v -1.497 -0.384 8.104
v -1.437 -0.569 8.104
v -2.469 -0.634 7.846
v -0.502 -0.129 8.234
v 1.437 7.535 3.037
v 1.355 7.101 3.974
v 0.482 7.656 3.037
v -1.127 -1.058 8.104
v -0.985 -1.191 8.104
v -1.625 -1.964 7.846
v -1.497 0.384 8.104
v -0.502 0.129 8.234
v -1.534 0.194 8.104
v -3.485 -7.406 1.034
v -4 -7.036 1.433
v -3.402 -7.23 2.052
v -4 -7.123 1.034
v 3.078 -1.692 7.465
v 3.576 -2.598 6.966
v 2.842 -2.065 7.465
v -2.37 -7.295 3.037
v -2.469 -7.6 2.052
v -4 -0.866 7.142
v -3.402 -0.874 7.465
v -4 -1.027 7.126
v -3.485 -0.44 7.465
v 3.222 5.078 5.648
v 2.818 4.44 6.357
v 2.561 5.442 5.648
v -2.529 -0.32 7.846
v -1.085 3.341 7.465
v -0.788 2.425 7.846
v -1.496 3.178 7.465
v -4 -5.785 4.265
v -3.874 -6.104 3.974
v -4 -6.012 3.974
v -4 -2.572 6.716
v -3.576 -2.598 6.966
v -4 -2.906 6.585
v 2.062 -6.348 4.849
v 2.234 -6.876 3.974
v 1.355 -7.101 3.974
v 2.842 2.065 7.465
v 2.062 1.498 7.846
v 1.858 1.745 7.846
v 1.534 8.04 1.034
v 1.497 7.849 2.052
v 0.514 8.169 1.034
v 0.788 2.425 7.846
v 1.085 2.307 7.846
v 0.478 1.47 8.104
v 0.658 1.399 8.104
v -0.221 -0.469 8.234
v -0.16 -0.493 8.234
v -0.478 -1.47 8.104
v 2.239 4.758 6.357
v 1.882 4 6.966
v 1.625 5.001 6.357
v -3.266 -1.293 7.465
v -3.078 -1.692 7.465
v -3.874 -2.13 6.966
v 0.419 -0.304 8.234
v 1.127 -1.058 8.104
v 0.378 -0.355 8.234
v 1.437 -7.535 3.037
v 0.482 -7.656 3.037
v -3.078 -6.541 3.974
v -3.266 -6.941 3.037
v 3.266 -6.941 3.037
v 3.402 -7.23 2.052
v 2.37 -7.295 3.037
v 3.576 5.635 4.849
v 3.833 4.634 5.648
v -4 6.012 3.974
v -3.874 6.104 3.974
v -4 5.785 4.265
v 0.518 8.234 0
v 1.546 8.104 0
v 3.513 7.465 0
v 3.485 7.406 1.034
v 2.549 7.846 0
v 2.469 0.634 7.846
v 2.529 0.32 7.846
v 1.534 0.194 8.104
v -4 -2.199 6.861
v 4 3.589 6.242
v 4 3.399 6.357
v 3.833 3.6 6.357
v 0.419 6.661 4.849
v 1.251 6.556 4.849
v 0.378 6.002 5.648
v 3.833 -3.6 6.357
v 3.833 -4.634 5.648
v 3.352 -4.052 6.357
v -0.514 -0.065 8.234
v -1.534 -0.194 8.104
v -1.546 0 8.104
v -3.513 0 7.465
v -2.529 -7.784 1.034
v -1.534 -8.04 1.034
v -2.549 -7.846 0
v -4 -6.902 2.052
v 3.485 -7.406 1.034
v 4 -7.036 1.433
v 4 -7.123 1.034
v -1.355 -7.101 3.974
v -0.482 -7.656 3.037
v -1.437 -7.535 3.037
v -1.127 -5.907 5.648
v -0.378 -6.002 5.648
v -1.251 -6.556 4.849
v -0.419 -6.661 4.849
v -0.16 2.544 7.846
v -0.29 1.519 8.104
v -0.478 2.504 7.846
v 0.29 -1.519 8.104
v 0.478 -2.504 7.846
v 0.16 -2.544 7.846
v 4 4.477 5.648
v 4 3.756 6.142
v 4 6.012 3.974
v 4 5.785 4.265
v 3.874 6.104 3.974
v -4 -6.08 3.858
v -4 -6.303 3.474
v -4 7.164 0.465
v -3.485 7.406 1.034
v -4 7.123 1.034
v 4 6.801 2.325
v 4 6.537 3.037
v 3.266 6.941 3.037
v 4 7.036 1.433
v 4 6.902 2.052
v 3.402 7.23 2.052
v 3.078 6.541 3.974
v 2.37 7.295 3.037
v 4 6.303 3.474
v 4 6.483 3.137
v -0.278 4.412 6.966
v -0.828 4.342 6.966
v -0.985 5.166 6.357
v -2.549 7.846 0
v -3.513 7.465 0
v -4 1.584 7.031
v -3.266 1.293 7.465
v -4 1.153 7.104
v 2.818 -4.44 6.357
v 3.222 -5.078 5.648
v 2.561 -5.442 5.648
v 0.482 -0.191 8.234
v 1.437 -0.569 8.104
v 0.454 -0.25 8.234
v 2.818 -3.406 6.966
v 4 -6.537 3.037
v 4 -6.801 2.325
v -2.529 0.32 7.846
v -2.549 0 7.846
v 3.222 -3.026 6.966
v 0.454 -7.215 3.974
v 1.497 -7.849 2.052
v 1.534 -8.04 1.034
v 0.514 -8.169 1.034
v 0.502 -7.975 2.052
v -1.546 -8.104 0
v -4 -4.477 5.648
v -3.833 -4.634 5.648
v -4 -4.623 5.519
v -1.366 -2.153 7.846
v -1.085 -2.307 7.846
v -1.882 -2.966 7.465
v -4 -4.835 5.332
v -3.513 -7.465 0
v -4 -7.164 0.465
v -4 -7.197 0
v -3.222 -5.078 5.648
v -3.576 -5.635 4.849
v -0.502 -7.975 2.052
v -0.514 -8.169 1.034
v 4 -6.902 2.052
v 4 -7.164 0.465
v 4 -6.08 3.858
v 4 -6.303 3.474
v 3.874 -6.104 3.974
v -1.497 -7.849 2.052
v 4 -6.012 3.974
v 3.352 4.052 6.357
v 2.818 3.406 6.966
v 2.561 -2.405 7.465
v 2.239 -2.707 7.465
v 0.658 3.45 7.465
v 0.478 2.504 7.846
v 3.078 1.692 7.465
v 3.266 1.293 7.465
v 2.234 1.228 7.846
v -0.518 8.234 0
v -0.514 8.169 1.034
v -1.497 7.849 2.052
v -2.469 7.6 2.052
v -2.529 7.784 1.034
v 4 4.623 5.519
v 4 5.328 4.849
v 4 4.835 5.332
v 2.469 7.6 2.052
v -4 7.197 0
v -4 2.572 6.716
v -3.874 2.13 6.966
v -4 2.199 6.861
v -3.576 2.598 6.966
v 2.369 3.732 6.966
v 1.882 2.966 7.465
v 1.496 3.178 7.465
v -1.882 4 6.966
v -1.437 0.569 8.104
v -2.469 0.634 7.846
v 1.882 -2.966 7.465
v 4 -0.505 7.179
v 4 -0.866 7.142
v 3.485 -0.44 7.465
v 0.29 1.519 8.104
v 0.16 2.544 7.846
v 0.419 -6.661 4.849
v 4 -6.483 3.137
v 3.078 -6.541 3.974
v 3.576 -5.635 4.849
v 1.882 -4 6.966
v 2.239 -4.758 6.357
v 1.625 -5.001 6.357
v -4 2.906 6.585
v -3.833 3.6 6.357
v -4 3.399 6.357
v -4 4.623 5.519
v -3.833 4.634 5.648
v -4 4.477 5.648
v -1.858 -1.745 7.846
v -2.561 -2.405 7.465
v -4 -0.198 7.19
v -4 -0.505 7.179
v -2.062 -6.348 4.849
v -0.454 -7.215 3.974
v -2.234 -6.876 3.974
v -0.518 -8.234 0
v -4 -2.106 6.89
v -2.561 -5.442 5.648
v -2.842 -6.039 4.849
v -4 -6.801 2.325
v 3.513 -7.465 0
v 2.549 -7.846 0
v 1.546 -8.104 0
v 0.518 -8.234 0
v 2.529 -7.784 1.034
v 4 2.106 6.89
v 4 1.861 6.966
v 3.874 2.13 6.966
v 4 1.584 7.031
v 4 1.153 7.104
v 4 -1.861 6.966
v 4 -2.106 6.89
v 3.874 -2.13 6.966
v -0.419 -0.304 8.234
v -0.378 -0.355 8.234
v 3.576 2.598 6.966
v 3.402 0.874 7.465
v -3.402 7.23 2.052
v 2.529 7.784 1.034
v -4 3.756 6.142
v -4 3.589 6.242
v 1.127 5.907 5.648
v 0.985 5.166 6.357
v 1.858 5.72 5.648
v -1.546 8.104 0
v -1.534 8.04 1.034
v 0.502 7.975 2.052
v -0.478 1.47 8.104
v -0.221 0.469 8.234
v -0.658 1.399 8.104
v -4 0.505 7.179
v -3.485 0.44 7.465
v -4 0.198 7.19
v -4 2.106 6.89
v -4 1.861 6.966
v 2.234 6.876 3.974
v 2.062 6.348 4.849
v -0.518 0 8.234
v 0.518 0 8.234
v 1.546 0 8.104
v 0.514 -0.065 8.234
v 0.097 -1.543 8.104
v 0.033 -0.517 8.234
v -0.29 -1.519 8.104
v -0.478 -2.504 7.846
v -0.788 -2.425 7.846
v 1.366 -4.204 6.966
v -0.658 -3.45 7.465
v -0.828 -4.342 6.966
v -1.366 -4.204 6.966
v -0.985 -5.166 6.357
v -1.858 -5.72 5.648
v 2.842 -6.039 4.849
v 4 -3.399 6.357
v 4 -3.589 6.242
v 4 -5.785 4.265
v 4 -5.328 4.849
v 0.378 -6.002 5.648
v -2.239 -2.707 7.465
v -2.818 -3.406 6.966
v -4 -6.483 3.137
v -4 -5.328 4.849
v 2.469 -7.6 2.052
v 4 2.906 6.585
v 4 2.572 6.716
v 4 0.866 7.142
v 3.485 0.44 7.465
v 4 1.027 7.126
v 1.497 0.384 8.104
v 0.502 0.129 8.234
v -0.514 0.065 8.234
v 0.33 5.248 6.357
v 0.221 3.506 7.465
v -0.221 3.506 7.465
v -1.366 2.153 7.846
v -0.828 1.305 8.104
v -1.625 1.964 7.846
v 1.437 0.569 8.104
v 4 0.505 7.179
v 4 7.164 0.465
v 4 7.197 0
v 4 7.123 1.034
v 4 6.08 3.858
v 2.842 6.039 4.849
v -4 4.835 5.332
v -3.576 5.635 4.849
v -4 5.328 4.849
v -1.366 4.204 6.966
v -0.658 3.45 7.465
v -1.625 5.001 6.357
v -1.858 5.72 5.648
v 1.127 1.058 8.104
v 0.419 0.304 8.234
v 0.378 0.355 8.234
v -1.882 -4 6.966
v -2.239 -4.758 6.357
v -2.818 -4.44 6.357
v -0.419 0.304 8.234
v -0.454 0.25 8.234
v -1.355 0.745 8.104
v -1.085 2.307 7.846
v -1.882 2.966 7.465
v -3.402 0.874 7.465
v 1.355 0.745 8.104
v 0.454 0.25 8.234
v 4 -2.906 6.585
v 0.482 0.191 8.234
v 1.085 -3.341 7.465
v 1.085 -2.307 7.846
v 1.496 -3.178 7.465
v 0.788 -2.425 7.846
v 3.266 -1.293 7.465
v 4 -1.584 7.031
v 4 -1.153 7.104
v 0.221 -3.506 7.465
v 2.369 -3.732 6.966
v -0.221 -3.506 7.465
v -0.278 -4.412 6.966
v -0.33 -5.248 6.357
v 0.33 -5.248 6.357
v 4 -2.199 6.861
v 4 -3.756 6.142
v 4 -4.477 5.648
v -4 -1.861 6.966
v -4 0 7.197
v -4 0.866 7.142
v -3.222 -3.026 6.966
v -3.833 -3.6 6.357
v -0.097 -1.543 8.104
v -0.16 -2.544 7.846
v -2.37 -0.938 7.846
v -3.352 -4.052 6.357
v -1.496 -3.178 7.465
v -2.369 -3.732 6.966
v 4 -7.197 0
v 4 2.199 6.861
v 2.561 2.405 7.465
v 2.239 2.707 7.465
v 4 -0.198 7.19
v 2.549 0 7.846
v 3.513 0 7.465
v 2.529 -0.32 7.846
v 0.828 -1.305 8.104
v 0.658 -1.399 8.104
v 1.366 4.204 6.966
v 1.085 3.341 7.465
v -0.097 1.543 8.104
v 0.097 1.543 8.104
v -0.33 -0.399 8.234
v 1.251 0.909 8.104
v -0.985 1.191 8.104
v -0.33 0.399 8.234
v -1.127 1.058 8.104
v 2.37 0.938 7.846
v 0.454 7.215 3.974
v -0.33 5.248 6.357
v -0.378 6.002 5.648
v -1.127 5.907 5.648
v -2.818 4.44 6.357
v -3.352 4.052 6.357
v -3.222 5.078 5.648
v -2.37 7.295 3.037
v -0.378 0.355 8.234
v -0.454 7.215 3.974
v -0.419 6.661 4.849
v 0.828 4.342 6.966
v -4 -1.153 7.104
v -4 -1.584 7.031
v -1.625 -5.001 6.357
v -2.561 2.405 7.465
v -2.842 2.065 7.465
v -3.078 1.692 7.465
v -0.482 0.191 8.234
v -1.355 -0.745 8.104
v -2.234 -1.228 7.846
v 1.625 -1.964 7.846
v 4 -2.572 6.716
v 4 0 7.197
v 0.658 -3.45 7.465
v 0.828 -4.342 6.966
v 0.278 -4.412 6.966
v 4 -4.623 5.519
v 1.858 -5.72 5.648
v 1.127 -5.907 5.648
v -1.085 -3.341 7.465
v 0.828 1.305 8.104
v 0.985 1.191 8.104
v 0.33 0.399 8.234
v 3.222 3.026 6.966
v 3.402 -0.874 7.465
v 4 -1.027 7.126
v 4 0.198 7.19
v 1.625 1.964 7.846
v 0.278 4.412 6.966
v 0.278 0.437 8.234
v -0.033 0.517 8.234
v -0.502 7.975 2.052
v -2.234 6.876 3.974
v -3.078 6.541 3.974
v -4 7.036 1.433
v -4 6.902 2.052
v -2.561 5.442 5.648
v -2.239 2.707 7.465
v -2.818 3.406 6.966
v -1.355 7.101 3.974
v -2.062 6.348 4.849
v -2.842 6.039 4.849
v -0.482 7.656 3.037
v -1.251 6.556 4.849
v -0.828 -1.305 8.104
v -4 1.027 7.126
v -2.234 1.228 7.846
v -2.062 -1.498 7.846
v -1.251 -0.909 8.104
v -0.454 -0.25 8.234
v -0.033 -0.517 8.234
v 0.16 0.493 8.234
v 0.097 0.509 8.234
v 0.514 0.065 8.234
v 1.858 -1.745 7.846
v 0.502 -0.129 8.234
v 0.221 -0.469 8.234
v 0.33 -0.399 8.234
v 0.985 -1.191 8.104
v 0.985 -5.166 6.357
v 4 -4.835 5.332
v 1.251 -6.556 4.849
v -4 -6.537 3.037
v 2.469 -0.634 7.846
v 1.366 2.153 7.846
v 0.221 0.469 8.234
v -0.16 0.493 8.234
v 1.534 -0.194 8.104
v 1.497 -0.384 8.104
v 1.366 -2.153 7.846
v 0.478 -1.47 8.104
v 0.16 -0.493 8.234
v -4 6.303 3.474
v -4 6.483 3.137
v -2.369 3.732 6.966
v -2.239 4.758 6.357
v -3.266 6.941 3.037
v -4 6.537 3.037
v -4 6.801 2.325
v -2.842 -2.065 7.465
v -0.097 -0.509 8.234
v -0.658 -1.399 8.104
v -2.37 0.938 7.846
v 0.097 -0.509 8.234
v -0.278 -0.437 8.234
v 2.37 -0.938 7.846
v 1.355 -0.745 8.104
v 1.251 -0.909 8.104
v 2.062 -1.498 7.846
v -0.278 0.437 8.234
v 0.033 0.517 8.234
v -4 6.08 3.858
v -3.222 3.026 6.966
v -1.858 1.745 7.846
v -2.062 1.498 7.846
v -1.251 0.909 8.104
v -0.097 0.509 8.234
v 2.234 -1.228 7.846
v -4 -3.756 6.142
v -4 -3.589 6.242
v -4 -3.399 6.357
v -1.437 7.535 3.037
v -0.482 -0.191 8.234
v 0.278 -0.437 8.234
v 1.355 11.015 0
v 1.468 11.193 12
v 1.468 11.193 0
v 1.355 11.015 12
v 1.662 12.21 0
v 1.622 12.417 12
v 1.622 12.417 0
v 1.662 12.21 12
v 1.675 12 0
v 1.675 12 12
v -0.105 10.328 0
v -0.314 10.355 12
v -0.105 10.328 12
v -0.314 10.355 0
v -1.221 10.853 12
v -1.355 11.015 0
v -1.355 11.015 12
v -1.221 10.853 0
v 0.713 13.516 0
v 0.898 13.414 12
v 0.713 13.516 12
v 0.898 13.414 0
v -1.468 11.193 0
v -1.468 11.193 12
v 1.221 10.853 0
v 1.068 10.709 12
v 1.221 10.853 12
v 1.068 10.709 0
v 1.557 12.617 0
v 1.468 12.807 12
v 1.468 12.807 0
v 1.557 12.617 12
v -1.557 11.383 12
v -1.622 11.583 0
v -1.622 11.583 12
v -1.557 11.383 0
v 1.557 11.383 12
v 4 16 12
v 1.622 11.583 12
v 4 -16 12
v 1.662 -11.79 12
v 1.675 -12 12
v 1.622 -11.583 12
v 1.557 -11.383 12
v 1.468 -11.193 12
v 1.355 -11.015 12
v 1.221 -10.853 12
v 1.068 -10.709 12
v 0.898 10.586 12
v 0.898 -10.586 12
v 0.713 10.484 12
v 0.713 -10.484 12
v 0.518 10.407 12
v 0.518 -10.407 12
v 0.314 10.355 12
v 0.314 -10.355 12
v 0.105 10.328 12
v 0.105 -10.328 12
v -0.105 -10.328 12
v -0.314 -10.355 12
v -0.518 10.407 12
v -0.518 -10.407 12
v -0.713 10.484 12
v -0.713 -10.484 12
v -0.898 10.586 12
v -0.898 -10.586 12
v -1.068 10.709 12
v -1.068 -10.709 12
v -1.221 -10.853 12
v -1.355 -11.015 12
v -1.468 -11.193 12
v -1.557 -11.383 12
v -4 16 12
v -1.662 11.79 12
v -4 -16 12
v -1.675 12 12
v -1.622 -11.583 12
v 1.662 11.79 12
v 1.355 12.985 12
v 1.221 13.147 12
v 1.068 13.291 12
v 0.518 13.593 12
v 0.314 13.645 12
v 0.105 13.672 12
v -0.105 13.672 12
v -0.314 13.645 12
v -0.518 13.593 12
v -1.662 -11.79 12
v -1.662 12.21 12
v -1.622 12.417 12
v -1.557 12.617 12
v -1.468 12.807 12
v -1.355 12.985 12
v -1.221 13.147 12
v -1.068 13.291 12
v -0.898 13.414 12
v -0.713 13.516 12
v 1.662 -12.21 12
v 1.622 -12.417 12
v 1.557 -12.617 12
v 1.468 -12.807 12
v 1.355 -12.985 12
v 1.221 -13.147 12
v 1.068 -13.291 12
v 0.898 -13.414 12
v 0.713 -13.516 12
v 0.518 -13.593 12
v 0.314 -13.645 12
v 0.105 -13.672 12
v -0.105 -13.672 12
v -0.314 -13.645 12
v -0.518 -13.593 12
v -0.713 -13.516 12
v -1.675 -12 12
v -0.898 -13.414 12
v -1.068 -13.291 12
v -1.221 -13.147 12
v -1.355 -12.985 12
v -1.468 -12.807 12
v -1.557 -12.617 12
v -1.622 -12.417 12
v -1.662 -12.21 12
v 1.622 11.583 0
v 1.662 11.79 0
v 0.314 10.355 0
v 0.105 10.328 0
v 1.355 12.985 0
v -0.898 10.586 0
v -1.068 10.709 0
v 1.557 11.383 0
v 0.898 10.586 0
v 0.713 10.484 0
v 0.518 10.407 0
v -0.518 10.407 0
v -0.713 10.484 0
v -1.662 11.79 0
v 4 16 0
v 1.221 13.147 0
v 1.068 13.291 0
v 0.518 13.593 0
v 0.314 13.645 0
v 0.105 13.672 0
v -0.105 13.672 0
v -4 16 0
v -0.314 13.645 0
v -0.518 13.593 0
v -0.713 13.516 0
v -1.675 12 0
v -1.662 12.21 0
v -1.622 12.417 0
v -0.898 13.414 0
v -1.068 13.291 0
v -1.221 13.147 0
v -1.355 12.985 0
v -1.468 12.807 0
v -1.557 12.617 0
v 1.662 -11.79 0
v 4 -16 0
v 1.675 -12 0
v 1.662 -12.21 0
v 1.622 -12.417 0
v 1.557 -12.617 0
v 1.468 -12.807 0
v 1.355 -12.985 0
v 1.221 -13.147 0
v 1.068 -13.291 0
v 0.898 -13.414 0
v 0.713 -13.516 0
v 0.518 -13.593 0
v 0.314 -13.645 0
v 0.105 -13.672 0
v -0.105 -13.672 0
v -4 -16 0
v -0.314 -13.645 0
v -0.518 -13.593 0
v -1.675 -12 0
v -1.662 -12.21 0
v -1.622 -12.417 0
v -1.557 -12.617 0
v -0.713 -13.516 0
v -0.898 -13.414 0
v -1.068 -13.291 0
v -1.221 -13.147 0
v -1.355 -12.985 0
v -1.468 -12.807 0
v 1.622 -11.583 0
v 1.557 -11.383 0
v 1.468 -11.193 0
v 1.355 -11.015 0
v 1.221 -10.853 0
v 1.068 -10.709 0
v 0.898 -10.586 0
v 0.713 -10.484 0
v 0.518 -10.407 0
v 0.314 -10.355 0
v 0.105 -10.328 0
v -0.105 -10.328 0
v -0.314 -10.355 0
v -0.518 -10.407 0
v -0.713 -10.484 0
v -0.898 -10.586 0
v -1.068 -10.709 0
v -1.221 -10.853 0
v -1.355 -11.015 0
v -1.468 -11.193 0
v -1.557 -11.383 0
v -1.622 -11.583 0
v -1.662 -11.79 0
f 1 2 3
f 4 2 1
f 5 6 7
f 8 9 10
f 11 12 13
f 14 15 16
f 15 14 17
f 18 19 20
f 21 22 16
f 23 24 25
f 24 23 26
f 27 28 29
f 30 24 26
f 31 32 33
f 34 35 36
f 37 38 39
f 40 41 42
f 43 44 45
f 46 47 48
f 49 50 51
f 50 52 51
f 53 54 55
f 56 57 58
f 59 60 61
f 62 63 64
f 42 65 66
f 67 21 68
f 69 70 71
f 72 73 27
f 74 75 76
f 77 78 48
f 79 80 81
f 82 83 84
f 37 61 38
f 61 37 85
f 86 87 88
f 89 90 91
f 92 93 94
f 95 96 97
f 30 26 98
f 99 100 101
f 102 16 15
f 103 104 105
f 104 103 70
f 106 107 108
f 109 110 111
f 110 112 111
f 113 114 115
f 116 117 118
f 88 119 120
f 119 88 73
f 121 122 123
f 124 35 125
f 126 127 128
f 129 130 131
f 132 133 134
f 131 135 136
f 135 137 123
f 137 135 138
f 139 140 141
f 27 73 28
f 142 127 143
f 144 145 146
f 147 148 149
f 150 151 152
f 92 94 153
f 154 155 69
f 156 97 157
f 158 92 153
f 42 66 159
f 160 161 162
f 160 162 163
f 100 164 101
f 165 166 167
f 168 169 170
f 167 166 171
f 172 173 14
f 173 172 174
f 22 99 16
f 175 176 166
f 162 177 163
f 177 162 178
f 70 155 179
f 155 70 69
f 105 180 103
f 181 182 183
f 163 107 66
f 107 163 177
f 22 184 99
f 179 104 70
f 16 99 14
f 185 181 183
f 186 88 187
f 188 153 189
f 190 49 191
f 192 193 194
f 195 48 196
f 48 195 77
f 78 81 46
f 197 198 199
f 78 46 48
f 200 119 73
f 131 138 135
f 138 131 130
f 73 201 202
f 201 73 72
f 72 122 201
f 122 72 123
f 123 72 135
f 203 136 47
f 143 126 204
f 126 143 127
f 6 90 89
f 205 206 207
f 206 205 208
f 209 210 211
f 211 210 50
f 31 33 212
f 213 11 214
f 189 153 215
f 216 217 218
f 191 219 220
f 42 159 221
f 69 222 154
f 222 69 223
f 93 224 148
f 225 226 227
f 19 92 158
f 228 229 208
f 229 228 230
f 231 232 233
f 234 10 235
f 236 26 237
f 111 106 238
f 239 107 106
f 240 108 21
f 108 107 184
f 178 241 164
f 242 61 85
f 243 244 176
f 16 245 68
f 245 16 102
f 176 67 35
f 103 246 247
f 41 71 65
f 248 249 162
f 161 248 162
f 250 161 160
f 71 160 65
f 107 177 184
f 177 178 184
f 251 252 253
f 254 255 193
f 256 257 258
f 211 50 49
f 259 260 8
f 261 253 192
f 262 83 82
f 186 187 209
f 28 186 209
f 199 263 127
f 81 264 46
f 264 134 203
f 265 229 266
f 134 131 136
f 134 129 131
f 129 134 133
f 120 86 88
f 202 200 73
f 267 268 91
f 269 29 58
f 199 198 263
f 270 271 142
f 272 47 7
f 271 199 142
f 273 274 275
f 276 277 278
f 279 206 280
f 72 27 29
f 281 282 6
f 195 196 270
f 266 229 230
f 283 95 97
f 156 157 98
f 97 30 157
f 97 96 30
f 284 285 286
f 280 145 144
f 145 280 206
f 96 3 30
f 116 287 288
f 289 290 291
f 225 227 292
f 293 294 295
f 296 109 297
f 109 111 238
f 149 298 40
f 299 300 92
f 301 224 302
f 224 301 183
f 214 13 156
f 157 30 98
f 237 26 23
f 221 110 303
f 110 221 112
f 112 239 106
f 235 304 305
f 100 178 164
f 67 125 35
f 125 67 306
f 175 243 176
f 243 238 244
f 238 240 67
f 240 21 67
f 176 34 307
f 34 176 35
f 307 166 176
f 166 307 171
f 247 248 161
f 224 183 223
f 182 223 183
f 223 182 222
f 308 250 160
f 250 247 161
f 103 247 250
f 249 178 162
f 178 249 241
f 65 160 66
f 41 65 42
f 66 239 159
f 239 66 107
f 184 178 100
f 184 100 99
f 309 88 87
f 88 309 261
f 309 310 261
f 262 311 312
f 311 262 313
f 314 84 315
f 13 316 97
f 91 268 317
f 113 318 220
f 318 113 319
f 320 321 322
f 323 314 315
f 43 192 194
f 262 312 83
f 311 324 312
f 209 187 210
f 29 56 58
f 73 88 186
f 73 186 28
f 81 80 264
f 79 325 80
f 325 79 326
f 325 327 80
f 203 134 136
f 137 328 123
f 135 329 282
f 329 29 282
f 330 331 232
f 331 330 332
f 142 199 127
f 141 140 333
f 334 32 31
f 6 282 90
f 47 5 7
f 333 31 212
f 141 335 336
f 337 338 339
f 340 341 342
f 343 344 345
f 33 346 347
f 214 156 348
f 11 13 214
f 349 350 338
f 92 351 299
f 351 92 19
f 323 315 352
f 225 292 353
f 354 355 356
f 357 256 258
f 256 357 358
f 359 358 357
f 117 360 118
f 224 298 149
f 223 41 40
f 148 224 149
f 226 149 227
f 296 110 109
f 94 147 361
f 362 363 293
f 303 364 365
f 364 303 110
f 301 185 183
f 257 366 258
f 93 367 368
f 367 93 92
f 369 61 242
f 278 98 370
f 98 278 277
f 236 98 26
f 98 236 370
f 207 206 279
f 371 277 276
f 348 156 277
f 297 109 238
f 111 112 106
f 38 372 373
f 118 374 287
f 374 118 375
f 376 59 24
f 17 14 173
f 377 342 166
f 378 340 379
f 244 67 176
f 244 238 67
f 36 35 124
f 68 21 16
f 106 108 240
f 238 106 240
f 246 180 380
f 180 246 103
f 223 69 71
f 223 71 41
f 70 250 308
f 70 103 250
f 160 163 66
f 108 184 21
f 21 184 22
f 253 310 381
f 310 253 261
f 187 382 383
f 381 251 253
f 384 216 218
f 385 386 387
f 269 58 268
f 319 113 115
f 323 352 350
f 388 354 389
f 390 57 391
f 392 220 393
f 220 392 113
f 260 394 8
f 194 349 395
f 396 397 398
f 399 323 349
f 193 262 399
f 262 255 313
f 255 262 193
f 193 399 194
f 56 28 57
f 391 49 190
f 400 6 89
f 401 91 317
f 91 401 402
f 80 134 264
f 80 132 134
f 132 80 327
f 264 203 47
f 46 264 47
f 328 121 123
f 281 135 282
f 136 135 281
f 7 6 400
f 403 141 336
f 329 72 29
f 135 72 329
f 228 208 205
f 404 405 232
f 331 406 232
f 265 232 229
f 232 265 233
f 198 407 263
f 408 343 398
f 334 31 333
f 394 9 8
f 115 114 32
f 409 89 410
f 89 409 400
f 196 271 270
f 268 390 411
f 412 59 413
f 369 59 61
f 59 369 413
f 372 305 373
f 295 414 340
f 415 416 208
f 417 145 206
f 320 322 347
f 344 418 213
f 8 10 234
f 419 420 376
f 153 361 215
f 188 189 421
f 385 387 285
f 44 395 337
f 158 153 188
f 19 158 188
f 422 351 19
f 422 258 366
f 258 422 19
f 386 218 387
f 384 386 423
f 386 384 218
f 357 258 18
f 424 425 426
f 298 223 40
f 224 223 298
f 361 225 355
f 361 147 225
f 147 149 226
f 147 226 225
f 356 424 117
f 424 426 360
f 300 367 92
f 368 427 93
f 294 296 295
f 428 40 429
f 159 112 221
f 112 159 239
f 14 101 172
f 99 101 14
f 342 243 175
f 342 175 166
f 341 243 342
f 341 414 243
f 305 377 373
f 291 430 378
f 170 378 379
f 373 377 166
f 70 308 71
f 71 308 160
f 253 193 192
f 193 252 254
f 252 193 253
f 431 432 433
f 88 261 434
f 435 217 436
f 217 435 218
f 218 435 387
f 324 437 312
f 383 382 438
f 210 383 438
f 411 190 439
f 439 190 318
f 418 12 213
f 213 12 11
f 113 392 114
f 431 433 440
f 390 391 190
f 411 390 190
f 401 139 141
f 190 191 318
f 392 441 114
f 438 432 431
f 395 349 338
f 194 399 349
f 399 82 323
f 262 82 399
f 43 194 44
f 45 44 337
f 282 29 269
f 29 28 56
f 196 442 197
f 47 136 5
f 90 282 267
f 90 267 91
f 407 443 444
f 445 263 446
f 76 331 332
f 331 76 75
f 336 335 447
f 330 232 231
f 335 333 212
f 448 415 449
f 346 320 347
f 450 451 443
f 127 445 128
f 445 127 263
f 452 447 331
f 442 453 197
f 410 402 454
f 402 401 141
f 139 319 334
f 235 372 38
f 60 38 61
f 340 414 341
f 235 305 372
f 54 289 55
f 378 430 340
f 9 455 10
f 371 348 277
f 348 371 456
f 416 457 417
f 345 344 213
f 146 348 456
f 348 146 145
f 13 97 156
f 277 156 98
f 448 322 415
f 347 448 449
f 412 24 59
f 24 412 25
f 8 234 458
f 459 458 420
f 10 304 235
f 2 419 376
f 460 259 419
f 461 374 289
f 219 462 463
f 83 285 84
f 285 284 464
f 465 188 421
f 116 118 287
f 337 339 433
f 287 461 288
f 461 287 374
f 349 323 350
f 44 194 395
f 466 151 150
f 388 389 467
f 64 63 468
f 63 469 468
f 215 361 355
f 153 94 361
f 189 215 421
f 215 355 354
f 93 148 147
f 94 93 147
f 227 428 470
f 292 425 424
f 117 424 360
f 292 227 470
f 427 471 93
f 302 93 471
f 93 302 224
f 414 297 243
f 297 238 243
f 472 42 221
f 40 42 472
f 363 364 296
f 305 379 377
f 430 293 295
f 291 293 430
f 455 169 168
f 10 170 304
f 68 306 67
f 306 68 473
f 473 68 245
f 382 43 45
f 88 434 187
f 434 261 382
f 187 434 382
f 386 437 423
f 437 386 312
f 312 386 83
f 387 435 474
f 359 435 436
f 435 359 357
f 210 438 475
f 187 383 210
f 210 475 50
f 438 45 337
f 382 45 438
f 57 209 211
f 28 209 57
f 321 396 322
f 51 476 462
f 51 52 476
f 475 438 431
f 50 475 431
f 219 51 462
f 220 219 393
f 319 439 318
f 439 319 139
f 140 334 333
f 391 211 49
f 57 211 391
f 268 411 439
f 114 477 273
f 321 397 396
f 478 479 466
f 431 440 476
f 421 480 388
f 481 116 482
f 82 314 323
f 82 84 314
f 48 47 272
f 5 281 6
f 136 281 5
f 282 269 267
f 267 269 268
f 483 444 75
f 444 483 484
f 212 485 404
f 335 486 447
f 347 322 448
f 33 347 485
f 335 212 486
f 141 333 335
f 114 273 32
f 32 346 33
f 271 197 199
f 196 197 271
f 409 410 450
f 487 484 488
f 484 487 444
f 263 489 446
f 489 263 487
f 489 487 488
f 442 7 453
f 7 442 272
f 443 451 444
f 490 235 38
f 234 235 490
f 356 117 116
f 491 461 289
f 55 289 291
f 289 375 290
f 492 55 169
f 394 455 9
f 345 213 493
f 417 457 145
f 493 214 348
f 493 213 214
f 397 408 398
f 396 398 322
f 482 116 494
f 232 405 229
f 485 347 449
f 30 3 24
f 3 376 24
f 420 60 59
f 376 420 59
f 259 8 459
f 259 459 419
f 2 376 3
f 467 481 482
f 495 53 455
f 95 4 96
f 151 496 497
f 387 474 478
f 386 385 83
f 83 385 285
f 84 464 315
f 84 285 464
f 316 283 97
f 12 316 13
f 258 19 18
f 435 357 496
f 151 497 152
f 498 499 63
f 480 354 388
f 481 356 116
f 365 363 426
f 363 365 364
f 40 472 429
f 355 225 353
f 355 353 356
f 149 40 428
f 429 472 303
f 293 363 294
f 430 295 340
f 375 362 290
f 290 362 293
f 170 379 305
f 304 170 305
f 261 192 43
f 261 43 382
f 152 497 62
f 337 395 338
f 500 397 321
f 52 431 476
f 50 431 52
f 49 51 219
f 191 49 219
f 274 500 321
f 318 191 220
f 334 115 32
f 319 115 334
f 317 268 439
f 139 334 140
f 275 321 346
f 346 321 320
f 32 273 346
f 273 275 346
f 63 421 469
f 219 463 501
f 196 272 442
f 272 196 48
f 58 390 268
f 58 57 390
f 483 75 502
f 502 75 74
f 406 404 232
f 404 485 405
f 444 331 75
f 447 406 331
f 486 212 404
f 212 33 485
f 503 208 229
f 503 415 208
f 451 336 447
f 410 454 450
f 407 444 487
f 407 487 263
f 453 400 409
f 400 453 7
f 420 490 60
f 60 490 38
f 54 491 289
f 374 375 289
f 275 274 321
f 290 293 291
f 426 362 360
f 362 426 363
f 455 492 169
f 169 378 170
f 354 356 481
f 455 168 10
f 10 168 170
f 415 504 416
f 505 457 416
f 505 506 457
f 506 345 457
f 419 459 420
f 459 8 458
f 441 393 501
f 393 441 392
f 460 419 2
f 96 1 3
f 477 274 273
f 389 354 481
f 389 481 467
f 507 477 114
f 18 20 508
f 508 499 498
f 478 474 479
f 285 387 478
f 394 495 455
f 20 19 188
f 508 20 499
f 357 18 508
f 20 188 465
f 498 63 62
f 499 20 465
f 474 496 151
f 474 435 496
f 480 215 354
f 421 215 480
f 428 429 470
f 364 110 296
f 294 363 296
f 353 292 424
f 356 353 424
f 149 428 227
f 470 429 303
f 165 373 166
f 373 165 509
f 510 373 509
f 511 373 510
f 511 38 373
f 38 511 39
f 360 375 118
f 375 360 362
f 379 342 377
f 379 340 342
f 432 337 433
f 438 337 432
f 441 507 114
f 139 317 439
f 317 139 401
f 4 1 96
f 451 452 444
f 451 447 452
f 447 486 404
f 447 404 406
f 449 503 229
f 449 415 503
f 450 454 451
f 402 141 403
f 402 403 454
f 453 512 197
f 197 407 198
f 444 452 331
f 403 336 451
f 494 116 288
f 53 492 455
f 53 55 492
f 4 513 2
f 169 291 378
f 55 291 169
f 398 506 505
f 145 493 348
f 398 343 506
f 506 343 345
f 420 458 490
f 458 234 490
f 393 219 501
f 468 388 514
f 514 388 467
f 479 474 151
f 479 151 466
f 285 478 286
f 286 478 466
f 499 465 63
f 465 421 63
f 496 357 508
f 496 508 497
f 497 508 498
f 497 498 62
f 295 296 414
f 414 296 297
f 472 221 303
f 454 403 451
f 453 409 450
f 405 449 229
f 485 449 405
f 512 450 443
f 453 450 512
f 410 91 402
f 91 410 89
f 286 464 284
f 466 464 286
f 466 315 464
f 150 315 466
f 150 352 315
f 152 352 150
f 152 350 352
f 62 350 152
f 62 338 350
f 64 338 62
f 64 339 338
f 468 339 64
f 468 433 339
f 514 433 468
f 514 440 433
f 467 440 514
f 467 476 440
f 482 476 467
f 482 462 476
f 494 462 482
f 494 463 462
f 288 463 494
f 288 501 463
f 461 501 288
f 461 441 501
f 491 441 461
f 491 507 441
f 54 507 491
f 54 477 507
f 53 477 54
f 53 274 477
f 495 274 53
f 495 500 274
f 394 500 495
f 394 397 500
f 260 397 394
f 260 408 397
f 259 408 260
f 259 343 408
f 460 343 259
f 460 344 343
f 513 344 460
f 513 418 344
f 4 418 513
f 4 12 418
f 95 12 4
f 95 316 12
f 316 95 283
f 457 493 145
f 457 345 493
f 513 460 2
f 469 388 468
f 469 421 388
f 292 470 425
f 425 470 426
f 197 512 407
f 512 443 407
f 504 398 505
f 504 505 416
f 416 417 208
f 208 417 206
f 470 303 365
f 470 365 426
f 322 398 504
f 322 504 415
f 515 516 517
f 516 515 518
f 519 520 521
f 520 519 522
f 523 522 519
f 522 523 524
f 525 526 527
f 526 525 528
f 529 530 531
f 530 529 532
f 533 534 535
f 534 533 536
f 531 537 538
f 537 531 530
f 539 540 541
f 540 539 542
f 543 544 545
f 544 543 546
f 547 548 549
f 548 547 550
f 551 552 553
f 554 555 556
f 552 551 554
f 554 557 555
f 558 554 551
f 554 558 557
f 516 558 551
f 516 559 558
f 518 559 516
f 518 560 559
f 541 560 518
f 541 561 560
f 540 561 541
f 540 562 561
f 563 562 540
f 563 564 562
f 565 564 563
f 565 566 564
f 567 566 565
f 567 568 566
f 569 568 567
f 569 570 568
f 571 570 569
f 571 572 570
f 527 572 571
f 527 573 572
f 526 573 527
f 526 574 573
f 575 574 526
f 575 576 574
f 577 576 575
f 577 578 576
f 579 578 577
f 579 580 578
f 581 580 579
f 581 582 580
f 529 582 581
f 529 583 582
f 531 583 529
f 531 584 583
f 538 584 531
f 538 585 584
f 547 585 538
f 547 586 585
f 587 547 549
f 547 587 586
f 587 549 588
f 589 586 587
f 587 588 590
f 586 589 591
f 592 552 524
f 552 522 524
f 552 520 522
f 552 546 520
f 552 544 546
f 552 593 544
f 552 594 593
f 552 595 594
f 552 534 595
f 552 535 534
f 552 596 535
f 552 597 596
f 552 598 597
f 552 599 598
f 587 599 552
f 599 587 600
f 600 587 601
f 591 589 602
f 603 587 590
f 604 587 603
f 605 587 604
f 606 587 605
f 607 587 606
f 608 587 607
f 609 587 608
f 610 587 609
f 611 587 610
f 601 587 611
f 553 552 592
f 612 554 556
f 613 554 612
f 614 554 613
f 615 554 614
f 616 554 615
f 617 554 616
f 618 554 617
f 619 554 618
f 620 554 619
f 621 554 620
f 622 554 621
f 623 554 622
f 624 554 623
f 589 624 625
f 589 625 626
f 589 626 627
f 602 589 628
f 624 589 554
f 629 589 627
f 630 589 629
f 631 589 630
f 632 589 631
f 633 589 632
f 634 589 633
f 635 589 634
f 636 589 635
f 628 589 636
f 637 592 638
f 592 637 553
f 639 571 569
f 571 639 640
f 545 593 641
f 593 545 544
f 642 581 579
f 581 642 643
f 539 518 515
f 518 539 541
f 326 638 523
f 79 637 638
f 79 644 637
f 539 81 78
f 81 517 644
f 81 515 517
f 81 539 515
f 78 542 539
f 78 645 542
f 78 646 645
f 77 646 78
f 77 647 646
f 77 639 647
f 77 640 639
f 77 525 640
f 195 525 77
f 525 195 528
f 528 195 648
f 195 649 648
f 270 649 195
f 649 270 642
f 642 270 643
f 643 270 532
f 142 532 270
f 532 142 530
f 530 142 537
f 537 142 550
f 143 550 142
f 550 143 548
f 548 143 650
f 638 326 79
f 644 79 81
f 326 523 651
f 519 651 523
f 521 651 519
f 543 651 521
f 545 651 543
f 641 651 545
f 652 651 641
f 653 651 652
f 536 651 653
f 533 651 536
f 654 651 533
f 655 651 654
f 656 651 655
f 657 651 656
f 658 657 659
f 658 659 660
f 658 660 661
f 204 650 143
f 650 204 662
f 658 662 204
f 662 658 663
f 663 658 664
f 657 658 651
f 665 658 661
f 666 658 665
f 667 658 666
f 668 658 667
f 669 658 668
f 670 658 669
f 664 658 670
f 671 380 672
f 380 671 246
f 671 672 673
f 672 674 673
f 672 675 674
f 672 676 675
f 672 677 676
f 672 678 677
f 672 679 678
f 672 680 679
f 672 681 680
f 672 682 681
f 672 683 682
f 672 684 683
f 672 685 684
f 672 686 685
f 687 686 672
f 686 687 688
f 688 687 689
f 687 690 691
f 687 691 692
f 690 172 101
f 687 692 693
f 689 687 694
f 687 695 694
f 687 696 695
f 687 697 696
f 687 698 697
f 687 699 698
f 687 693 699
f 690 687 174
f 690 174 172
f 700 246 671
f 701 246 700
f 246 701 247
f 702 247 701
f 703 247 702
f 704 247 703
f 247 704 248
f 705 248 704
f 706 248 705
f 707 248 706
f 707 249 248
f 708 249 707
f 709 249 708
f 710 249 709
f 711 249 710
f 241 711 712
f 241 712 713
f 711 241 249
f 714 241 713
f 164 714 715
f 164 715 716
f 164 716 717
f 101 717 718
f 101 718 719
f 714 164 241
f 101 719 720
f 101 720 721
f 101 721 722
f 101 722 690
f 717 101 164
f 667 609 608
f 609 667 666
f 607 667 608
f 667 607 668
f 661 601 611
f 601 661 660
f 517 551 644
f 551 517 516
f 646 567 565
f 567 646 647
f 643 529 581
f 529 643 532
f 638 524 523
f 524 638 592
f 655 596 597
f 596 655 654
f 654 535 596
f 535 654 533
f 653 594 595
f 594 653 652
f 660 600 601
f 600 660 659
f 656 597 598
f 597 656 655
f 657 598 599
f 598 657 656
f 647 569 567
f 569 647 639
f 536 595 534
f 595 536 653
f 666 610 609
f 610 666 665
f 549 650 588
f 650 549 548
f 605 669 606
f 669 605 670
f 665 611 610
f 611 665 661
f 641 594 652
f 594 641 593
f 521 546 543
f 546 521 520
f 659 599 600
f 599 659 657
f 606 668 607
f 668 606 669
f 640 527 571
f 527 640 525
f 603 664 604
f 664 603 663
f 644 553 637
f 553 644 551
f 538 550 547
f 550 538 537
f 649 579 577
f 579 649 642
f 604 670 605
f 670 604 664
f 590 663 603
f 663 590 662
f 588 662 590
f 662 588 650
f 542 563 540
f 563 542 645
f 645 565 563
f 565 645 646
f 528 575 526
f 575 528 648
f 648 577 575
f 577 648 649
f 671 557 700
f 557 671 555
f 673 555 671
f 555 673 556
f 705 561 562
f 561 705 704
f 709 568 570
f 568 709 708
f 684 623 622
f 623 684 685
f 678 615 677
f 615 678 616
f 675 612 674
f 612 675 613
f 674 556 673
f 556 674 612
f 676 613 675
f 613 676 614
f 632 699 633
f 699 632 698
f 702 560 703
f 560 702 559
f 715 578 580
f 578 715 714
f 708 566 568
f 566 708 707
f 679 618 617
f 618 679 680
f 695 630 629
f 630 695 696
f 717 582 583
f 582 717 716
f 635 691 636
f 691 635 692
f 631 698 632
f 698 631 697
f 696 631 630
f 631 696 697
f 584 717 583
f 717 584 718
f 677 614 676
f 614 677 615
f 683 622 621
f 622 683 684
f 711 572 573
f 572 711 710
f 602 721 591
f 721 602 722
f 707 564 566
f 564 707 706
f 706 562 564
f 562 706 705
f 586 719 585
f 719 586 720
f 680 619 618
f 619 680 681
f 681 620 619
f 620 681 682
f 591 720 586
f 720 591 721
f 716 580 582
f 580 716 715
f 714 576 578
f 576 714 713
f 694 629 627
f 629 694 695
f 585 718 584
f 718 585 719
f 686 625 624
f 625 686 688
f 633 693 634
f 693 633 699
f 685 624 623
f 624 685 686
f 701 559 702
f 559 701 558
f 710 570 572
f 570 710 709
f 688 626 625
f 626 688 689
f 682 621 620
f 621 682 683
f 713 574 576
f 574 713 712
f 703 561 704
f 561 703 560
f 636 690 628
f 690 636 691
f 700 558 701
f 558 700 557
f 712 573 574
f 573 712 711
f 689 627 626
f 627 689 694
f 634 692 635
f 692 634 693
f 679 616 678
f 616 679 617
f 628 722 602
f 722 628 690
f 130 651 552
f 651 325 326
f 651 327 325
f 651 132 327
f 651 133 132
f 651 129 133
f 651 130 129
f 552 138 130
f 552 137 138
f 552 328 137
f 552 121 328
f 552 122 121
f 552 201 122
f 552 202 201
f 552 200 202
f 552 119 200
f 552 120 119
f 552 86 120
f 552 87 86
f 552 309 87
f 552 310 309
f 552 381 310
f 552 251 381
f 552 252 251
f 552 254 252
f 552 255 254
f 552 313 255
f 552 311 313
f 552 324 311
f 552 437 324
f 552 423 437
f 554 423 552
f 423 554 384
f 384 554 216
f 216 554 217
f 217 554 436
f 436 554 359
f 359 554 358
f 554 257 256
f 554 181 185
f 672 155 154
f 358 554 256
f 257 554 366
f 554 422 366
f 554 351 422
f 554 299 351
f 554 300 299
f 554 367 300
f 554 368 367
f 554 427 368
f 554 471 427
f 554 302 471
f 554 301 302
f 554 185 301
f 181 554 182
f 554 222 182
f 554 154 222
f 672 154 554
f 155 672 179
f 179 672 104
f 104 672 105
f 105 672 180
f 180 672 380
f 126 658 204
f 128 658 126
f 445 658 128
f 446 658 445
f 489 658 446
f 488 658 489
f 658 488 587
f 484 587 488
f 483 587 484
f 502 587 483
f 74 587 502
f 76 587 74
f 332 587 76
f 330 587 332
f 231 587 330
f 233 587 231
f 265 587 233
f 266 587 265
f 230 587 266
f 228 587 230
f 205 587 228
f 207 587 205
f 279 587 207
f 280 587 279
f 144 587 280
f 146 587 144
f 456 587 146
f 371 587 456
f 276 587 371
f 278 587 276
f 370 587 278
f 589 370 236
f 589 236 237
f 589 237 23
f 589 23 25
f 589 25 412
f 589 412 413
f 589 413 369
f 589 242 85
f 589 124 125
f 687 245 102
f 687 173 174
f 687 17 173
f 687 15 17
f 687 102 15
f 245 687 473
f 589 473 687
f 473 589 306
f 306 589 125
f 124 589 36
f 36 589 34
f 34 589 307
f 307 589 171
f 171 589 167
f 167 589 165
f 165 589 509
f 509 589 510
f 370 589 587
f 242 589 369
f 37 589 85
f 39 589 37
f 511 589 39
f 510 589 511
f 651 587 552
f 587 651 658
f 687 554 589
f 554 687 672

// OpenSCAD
// arm cap

sphere_dia = 16.0;

arm_depth = 8;
arm_width = sphere_dia + 2 * 8;
arm_height = sphere_dia/2 + 4;


m4_pilot = 3.35;

$fn = 50;

difference () {
    union () {

        // arm height is on TOP of plate
        translate([0,0, arm_height/2])
        cube([arm_depth, arm_width, arm_height], center = true);
    }
    // holes
    union () {
       
        // mounting sphere
        sphere(r = (sphere_dia + 0.5)/2);
        
        // cap screw holes
        translate([0, arm_width/2 - 4,0])
        cylinder(r = m4_pilot/2, h = arm_height, center = false);
        
        translate([0, -(arm_width/2 - 4),0])
        cylinder(r = m4_pilot/2, h = arm_height, center = false);
        
    }
}
